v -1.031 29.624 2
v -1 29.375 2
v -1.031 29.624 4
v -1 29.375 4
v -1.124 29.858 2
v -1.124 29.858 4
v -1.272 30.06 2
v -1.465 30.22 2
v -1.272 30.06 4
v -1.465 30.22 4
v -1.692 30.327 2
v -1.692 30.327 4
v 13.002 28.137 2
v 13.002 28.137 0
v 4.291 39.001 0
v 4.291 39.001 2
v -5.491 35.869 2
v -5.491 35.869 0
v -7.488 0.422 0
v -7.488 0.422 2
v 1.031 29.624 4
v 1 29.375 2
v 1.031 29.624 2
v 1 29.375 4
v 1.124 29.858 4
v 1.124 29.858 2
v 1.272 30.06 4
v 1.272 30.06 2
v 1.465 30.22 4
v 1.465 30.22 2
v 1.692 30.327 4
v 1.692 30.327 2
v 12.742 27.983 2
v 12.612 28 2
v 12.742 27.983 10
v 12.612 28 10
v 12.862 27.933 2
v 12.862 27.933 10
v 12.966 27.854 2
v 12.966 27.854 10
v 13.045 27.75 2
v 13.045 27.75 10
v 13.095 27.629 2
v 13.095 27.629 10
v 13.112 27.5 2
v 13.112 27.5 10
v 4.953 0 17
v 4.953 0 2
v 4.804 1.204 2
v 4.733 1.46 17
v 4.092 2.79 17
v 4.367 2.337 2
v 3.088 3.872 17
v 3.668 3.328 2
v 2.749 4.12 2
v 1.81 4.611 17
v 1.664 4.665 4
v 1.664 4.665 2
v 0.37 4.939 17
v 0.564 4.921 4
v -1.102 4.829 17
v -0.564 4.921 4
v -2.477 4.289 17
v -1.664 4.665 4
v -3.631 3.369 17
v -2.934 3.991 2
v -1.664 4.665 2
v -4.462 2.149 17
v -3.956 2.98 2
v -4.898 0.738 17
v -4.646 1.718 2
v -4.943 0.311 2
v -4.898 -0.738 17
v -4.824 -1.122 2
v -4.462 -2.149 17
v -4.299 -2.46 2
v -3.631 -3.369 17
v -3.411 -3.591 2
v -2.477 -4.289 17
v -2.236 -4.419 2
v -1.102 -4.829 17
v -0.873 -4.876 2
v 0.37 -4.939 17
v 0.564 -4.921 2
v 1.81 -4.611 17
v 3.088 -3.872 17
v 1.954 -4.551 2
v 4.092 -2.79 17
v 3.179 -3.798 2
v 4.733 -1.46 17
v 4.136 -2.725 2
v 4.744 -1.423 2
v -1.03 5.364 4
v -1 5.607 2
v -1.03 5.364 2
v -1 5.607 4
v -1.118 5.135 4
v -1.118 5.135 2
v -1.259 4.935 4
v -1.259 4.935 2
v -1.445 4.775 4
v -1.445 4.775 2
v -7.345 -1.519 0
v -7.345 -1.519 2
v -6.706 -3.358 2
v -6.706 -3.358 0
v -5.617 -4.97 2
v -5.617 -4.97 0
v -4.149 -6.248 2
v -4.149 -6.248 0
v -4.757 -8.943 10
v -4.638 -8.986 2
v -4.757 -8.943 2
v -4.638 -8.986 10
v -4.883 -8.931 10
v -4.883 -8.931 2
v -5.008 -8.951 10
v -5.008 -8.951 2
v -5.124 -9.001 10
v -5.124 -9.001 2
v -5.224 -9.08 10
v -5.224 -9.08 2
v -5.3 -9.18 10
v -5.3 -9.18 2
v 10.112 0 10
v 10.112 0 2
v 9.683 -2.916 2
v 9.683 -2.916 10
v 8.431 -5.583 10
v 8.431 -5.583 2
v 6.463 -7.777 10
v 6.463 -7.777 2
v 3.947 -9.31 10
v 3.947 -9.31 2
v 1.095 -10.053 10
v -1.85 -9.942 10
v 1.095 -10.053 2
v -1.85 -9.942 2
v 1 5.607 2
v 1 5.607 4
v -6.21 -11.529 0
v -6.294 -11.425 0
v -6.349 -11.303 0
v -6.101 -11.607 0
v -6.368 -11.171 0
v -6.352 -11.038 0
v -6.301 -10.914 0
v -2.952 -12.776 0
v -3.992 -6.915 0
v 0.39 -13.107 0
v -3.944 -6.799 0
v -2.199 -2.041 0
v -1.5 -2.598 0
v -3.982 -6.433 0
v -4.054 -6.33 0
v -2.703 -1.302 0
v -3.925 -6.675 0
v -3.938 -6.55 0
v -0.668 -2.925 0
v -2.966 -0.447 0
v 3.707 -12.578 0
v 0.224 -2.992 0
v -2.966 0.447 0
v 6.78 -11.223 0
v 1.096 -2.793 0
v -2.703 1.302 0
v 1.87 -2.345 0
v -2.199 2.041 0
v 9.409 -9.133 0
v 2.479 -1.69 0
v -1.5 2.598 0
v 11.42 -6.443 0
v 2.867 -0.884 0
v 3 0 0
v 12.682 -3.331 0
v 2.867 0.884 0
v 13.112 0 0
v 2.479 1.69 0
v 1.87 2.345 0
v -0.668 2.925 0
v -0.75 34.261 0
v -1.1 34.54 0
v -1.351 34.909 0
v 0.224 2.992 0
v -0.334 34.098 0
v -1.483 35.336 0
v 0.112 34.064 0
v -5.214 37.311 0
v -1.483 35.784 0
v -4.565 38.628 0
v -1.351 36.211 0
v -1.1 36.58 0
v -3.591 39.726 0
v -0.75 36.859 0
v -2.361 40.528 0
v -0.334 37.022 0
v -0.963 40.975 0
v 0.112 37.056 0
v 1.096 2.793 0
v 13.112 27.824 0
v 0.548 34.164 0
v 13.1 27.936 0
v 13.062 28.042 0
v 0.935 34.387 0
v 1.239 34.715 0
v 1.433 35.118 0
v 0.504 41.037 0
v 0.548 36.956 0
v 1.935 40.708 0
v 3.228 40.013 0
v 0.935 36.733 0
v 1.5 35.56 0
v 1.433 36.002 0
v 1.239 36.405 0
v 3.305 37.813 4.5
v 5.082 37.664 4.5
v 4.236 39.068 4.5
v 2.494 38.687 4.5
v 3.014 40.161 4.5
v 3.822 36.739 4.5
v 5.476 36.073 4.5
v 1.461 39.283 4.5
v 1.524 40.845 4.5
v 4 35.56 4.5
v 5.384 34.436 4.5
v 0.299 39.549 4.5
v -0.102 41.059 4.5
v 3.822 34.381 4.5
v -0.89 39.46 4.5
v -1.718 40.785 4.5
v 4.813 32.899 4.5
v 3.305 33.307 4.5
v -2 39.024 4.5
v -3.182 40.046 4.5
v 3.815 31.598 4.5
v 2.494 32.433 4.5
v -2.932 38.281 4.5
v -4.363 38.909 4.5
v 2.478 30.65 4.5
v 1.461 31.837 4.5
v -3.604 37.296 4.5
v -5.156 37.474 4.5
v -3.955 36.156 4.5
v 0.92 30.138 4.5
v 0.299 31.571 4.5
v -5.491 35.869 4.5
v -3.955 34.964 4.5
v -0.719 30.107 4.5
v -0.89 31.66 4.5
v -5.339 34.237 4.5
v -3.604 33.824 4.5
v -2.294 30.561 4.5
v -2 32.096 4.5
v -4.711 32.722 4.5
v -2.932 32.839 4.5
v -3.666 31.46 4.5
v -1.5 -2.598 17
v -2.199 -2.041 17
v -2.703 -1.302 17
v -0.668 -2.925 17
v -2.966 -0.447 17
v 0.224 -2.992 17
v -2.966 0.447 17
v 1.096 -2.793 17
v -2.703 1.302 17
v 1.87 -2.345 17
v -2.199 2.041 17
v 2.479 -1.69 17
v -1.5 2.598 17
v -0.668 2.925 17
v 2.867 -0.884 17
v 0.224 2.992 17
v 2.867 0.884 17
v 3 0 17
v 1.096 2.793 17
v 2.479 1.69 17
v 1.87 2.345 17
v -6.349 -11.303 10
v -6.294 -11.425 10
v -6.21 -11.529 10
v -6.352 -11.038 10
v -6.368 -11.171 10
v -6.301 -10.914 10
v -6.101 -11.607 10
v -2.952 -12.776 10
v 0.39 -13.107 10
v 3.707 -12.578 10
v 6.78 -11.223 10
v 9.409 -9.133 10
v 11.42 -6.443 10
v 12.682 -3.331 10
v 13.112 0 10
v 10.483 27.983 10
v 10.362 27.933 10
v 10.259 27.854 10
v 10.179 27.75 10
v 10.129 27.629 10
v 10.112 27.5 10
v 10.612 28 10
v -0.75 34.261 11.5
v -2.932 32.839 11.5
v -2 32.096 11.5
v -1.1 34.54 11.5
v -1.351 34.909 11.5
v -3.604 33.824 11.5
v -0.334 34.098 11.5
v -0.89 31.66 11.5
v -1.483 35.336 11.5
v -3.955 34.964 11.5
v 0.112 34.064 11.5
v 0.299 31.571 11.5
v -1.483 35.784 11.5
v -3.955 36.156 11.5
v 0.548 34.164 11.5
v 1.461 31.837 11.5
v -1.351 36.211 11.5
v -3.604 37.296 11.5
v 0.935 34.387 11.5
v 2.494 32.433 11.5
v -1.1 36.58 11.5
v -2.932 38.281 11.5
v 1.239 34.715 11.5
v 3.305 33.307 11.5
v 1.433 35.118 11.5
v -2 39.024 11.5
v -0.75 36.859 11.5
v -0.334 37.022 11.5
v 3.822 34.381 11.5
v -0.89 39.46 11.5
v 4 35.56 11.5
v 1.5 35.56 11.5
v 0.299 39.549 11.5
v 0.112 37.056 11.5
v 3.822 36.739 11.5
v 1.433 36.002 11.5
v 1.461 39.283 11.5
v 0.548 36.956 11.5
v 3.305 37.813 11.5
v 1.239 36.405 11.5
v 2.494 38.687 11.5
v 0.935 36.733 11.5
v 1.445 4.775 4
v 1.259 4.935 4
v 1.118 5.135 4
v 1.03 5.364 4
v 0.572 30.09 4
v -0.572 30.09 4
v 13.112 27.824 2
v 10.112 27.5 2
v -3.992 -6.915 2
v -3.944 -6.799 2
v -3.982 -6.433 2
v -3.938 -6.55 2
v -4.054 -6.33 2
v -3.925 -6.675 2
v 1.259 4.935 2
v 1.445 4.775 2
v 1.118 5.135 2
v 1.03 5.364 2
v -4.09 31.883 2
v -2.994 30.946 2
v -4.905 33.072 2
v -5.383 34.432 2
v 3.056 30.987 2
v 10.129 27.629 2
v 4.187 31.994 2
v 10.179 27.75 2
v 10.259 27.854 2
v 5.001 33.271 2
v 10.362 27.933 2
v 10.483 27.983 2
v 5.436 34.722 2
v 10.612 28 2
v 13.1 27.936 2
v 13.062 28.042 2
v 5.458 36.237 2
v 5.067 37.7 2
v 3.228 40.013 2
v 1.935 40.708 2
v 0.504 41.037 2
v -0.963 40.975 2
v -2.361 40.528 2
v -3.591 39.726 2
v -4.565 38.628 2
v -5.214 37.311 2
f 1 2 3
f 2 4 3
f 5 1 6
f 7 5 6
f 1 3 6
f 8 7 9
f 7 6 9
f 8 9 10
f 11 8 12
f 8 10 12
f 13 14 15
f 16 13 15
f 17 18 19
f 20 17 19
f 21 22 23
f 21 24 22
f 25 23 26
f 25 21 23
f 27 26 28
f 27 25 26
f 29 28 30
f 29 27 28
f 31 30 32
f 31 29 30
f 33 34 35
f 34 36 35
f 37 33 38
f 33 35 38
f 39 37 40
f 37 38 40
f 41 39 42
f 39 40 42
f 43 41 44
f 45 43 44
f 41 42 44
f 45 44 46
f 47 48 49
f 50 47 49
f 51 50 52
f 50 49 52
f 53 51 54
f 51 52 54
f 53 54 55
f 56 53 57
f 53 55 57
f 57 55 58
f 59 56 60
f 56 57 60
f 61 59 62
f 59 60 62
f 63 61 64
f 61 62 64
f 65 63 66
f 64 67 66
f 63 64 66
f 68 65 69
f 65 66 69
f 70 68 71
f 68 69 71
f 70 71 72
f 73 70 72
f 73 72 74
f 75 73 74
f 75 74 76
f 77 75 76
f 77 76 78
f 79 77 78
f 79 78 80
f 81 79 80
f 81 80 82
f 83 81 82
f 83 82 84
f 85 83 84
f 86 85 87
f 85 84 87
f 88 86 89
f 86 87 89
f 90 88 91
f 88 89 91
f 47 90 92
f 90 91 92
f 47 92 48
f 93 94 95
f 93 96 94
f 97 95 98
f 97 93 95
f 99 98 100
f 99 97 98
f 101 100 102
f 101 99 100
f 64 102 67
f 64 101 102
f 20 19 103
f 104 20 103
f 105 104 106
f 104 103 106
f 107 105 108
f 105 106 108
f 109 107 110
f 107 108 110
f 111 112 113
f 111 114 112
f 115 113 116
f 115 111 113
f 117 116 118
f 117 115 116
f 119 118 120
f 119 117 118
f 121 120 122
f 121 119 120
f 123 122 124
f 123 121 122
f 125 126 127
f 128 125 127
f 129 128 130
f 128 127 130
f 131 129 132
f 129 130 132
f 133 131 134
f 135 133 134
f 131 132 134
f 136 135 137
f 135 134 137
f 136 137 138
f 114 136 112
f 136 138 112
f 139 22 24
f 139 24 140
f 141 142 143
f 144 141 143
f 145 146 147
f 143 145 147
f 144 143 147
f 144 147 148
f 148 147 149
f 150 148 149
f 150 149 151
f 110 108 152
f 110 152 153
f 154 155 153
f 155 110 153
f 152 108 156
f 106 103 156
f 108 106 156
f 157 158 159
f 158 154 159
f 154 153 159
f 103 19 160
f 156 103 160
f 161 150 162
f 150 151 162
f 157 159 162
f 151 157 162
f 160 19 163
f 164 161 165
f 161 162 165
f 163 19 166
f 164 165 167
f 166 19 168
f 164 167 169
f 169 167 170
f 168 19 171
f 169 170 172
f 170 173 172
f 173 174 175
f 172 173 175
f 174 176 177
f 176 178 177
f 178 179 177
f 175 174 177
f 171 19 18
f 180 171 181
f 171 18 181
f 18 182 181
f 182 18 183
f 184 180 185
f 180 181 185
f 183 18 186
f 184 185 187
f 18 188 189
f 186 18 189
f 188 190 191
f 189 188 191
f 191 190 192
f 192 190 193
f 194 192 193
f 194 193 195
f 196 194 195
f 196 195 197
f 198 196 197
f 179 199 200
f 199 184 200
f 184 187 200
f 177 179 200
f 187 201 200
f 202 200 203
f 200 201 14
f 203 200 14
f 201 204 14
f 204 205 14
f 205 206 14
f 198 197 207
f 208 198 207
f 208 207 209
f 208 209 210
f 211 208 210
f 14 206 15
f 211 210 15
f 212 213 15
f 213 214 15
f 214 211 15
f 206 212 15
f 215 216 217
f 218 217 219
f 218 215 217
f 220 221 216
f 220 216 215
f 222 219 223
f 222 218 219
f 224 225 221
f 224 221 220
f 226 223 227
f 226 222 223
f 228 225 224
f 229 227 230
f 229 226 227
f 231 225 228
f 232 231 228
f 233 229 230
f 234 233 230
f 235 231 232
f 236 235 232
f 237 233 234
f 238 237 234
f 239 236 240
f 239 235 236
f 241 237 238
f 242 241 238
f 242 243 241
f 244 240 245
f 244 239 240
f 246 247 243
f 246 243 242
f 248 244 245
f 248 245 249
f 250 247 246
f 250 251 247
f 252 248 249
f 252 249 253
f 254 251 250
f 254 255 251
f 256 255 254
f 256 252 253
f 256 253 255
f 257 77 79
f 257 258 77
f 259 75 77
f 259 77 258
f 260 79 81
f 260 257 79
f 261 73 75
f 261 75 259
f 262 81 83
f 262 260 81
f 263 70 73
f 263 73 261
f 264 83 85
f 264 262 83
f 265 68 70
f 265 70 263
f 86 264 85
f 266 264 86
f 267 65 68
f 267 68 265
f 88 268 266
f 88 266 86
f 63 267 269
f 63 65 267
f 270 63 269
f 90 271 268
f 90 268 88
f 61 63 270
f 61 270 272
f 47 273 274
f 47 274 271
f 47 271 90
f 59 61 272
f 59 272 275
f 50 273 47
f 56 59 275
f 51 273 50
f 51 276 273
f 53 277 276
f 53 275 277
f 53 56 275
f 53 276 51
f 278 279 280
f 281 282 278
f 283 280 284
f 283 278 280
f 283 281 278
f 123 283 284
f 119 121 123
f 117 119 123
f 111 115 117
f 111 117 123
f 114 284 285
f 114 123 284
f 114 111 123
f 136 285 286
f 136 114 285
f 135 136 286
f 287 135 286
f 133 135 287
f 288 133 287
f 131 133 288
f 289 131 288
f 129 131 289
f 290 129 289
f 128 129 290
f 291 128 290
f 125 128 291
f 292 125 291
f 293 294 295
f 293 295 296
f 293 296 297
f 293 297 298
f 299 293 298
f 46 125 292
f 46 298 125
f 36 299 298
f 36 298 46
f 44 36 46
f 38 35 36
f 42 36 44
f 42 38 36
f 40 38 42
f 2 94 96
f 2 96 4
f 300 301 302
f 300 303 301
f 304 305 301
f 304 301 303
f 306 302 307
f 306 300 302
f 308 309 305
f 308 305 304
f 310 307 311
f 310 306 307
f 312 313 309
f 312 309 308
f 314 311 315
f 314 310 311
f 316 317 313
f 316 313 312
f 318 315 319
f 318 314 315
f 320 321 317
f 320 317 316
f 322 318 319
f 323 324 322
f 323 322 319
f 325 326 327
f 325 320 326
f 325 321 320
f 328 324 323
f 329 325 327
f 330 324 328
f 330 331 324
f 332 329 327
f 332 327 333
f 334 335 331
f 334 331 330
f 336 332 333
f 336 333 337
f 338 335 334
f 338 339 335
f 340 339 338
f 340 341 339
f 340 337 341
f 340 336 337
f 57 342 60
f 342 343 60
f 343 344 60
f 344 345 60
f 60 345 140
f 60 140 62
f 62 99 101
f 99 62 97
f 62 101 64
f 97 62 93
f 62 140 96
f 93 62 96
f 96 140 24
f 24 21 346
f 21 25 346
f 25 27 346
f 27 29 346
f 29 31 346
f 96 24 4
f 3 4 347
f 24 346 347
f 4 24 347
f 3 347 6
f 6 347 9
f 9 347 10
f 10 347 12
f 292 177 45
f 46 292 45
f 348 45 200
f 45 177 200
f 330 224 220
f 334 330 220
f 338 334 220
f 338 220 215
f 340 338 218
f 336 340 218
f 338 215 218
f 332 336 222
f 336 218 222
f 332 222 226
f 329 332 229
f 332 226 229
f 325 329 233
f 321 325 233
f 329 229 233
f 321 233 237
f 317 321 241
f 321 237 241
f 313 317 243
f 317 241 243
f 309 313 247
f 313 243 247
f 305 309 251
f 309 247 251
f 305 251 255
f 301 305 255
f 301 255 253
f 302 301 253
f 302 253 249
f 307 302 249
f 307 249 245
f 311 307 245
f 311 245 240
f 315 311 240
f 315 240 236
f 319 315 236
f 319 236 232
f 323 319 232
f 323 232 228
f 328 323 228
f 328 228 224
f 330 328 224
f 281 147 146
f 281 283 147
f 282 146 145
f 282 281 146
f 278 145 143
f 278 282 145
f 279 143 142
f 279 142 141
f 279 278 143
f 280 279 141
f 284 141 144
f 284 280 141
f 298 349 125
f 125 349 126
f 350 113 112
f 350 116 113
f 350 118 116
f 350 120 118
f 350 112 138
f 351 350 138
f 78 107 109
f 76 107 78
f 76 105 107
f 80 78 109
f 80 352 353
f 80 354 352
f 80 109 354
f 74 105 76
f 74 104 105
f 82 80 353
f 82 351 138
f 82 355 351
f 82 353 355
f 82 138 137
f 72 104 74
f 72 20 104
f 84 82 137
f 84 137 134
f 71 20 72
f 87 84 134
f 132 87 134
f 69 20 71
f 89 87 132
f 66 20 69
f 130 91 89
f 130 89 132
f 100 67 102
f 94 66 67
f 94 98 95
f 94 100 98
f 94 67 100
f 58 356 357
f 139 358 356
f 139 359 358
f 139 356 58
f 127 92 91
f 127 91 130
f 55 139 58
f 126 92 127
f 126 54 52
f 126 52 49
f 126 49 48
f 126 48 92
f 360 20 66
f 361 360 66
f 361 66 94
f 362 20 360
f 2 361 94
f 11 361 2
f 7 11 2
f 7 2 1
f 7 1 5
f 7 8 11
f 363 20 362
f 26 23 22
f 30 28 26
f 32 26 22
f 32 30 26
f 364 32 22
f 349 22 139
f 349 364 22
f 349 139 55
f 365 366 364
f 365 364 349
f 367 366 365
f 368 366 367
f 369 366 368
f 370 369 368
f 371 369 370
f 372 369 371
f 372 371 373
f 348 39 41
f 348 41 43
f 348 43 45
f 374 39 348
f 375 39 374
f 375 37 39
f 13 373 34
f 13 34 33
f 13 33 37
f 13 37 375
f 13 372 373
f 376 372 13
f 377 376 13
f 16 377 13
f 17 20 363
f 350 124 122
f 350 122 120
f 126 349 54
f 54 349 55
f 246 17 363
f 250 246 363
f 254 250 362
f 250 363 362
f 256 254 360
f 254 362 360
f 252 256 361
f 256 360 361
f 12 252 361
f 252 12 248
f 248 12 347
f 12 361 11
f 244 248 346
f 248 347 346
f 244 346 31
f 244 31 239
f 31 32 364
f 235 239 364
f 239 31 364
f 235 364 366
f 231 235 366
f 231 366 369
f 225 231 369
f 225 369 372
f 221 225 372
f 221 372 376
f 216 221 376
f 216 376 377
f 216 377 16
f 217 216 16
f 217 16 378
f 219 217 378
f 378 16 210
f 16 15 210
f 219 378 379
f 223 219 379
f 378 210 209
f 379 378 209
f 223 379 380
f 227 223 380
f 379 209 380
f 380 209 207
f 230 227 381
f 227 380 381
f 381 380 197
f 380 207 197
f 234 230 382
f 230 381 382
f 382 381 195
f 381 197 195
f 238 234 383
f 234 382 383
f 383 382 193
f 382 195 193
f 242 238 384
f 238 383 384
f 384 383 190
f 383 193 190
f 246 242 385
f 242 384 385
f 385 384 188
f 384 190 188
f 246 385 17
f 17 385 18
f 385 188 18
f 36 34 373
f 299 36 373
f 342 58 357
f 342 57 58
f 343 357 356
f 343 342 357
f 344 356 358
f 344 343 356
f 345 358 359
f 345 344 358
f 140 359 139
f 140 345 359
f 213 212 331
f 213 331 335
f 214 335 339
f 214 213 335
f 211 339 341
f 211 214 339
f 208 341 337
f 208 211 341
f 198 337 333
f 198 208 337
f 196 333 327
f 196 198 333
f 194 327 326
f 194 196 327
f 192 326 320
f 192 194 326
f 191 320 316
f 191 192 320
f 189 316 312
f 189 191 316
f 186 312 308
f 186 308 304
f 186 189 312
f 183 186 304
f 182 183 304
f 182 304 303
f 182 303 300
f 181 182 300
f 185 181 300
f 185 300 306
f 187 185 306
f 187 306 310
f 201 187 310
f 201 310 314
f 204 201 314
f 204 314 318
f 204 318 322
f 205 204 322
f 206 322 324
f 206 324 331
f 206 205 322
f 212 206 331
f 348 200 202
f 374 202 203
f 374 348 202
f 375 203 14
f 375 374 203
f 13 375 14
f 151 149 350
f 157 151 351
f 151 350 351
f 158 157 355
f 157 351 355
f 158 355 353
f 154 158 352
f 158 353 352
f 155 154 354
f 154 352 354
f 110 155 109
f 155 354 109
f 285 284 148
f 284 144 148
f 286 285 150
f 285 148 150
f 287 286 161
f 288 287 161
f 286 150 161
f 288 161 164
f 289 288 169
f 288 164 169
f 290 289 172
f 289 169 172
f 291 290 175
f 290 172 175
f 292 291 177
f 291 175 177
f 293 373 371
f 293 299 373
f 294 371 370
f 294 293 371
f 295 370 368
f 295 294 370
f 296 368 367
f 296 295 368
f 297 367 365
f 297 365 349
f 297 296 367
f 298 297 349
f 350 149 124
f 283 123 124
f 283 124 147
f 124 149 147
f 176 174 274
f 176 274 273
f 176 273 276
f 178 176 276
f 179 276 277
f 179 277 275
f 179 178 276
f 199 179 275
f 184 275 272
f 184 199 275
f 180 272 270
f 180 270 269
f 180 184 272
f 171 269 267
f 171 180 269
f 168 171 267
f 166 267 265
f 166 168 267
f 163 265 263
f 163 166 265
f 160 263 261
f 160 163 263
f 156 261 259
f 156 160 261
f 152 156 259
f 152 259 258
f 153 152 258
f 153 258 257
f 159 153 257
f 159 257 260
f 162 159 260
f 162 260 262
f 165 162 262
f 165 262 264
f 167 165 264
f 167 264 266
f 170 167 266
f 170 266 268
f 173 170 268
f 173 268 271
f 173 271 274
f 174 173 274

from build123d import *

# Parameters (mm, degrees)
SKETCH1_R           = 4.000000000000001
SKETCH1_R_2         = 3
BOSS_EXTRUDE1_DEPTH = 2
SKETCH1_3_R         = 4.953
SKETCH1_3_R_2       = 3
BOSS_EXTRUDE2_DEPTH = 17
BOSS_EXTRUDE3_DEPTH = 10
SKETCH1_6_R         = 4.000000000000001
SKETCH1_6_R_2       = 1.500000000000002
BOSS_EXTRUDE4_DEPTH = 11.5
BOSS_EXTRUDE5_START = 2
SKETCH1_7_R         = 5.499999999999999
SKETCH1_7_R_2       = 4.000000000000001
BOSS_EXTRUDE5_DEPTH = 2.5
BOSS_EXTRUDE6_DEPTH = 2
FILLET3_R           = 0.5
FILLET4_R           = 0.5
FILLET5_R           = 0.5
FILLET6_R           = 1


with BuildPart() as part:
    # Sketch1 → Boss-Extrude1 (new body)
    with BuildSketch(Plane.XY):
        with BuildLine():
            ThreePointArc((-6.556187499999929, -11.355649853948018), (6.556187500000035, -11.355649853947956), (13.112374999999998, 2.22e-15))
            Line((13.112374999999998, 0), (13.112374999999998, 28))
            Line((13.112374999999998, 28), (4.290790826966845, 39.00080137165997))
            ThreePointArc((4.2907908269668456, 39.00080137165997), (-1.6768483404792127, 40.79814658472174), (-5.491294112785424, 35.869336332958376))
            Line((-5.491294112785426, 35.869336332958376), (-7.488128335616488, 0.42182227221597307))
            ThreePointArc((-7.488128335616491, 0.42182227221597324), (-6.5981170528310535, -3.5657890230831226), (-3.74999999999996, -6.495190528383313))
            Line((-3.74999999999996, -6.495190528383313), (-6.556187499999929, -11.355649853948018))
        make_face()
        with Locations((0, 35.559999999999995)):
            Circle(SKETCH1_R, mode=Mode.SUBTRACT)
        Circle(SKETCH1_R_2, mode=Mode.SUBTRACT)
    extrude(amount=BOSS_EXTRUDE1_DEPTH)

    # Sketch1<3> → Boss-Extrude2 (add)
    with BuildSketch(Plane.XY):
        Circle(SKETCH1_3_R)
        Circle(SKETCH1_3_R_2, mode=Mode.SUBTRACT)
    extrude(amount=BOSS_EXTRUDE2_DEPTH)

    # Sketch1<5> → Boss-Extrude3 (add)
    with BuildSketch(Plane.XY):
        with BuildLine():
            Line((10.112375, 28), (10.112375, 0))
            ThreePointArc((10.112375, -8.9e-16), (5.056187500000027, -8.757573642594647), (-5.056187499999945, -8.757573642594695))
            Line((-5.056187499999945, -8.757573642594695), (-6.556187499999929, -11.355649853948018))
            ThreePointArc((-6.556187499999929, -11.355649853948018), (6.556187500000035, -11.355649853947956), (13.112374999999998, 2.22e-15))
            Line((13.112374999999998, 0), (13.112374999999998, 28))
            Line((13.112374999999998, 28), (10.112375, 28))
        make_face()
    extrude(amount=BOSS_EXTRUDE3_DEPTH)

    # Sketch1<6> → Boss-Extrude4 (add)
    with BuildSketch(Plane.XY):
        with Locations((0, 35.559999999999995)):
            Circle(SKETCH1_6_R)
        with Locations((0, 35.559999999999995)):
            Circle(SKETCH1_6_R_2, mode=Mode.SUBTRACT)
    extrude(amount=BOSS_EXTRUDE4_DEPTH)

    # Sketch1<7> → Boss-Extrude5 (add)
    with BuildSketch(Plane.XY.offset(BOSS_EXTRUDE5_START)):
        with Locations(Location((0, 35.559999999999995, 0), (0, 0, 176.775813858))):
            Circle(SKETCH1_7_R)
        with Locations((0, 35.559999999999995)):
            Circle(SKETCH1_7_R_2, mode=Mode.SUBTRACT)
    extrude(amount=BOSS_EXTRUDE5_DEPTH)

    # Sketch3 → Boss-Extrude6 (add)
    with BuildSketch(Plane.XY.offset(2)):
        Polygon((-1, 30.151673086804013), (1, 30.151673086804013), (0.9999999999999977, 4.851000824572183), (-0.9999999999999977, 4.851000824572183), align=None)
    extrude(amount=BOSS_EXTRUDE6_DEPTH)

    # Fillet3
    fillet3_edges = [part.edges().sort_by_distance(p)[0] for p in [
        (10.112375, 28, 6),
        (13.112374999999998, 28, 6),
    ]]
    fillet(fillet3_edges, radius=FILLET3_R)

    # Fillet4
    fillet4_edges = [part.edges().sort_by_distance(p)[0] for p in [
        (13.112374999999998, 28, 1),
    ]]
    fillet(fillet4_edges, radius=FILLET4_R)

    # Fillet5
    fillet5_edges = [part.edges().sort_by_distance(p)[0] for p in [
        (-6.556187499999929, -11.355649853948018, 5),
        (-3.7499999999999605, -6.495190528383313, 1),
        (-5.056187499999946, -8.757573642594695, 6),
    ]]
    fillet(fillet5_edges, radius=FILLET5_R)

    # Fillet6
    fillet6_edges = [part.edges().sort_by_distance(p)[0] for p in [
        (-1, 30.151673086804013, 3),
        (-0.9999999999999977, 4.851000824572183, 3),
        (0.9999999999999977, 4.851000824572183, 3),
        (1, 30.151673086804013, 3),
    ]]
    fillet(fillet6_edges, radius=FILLET6_R)


solid = part.part
